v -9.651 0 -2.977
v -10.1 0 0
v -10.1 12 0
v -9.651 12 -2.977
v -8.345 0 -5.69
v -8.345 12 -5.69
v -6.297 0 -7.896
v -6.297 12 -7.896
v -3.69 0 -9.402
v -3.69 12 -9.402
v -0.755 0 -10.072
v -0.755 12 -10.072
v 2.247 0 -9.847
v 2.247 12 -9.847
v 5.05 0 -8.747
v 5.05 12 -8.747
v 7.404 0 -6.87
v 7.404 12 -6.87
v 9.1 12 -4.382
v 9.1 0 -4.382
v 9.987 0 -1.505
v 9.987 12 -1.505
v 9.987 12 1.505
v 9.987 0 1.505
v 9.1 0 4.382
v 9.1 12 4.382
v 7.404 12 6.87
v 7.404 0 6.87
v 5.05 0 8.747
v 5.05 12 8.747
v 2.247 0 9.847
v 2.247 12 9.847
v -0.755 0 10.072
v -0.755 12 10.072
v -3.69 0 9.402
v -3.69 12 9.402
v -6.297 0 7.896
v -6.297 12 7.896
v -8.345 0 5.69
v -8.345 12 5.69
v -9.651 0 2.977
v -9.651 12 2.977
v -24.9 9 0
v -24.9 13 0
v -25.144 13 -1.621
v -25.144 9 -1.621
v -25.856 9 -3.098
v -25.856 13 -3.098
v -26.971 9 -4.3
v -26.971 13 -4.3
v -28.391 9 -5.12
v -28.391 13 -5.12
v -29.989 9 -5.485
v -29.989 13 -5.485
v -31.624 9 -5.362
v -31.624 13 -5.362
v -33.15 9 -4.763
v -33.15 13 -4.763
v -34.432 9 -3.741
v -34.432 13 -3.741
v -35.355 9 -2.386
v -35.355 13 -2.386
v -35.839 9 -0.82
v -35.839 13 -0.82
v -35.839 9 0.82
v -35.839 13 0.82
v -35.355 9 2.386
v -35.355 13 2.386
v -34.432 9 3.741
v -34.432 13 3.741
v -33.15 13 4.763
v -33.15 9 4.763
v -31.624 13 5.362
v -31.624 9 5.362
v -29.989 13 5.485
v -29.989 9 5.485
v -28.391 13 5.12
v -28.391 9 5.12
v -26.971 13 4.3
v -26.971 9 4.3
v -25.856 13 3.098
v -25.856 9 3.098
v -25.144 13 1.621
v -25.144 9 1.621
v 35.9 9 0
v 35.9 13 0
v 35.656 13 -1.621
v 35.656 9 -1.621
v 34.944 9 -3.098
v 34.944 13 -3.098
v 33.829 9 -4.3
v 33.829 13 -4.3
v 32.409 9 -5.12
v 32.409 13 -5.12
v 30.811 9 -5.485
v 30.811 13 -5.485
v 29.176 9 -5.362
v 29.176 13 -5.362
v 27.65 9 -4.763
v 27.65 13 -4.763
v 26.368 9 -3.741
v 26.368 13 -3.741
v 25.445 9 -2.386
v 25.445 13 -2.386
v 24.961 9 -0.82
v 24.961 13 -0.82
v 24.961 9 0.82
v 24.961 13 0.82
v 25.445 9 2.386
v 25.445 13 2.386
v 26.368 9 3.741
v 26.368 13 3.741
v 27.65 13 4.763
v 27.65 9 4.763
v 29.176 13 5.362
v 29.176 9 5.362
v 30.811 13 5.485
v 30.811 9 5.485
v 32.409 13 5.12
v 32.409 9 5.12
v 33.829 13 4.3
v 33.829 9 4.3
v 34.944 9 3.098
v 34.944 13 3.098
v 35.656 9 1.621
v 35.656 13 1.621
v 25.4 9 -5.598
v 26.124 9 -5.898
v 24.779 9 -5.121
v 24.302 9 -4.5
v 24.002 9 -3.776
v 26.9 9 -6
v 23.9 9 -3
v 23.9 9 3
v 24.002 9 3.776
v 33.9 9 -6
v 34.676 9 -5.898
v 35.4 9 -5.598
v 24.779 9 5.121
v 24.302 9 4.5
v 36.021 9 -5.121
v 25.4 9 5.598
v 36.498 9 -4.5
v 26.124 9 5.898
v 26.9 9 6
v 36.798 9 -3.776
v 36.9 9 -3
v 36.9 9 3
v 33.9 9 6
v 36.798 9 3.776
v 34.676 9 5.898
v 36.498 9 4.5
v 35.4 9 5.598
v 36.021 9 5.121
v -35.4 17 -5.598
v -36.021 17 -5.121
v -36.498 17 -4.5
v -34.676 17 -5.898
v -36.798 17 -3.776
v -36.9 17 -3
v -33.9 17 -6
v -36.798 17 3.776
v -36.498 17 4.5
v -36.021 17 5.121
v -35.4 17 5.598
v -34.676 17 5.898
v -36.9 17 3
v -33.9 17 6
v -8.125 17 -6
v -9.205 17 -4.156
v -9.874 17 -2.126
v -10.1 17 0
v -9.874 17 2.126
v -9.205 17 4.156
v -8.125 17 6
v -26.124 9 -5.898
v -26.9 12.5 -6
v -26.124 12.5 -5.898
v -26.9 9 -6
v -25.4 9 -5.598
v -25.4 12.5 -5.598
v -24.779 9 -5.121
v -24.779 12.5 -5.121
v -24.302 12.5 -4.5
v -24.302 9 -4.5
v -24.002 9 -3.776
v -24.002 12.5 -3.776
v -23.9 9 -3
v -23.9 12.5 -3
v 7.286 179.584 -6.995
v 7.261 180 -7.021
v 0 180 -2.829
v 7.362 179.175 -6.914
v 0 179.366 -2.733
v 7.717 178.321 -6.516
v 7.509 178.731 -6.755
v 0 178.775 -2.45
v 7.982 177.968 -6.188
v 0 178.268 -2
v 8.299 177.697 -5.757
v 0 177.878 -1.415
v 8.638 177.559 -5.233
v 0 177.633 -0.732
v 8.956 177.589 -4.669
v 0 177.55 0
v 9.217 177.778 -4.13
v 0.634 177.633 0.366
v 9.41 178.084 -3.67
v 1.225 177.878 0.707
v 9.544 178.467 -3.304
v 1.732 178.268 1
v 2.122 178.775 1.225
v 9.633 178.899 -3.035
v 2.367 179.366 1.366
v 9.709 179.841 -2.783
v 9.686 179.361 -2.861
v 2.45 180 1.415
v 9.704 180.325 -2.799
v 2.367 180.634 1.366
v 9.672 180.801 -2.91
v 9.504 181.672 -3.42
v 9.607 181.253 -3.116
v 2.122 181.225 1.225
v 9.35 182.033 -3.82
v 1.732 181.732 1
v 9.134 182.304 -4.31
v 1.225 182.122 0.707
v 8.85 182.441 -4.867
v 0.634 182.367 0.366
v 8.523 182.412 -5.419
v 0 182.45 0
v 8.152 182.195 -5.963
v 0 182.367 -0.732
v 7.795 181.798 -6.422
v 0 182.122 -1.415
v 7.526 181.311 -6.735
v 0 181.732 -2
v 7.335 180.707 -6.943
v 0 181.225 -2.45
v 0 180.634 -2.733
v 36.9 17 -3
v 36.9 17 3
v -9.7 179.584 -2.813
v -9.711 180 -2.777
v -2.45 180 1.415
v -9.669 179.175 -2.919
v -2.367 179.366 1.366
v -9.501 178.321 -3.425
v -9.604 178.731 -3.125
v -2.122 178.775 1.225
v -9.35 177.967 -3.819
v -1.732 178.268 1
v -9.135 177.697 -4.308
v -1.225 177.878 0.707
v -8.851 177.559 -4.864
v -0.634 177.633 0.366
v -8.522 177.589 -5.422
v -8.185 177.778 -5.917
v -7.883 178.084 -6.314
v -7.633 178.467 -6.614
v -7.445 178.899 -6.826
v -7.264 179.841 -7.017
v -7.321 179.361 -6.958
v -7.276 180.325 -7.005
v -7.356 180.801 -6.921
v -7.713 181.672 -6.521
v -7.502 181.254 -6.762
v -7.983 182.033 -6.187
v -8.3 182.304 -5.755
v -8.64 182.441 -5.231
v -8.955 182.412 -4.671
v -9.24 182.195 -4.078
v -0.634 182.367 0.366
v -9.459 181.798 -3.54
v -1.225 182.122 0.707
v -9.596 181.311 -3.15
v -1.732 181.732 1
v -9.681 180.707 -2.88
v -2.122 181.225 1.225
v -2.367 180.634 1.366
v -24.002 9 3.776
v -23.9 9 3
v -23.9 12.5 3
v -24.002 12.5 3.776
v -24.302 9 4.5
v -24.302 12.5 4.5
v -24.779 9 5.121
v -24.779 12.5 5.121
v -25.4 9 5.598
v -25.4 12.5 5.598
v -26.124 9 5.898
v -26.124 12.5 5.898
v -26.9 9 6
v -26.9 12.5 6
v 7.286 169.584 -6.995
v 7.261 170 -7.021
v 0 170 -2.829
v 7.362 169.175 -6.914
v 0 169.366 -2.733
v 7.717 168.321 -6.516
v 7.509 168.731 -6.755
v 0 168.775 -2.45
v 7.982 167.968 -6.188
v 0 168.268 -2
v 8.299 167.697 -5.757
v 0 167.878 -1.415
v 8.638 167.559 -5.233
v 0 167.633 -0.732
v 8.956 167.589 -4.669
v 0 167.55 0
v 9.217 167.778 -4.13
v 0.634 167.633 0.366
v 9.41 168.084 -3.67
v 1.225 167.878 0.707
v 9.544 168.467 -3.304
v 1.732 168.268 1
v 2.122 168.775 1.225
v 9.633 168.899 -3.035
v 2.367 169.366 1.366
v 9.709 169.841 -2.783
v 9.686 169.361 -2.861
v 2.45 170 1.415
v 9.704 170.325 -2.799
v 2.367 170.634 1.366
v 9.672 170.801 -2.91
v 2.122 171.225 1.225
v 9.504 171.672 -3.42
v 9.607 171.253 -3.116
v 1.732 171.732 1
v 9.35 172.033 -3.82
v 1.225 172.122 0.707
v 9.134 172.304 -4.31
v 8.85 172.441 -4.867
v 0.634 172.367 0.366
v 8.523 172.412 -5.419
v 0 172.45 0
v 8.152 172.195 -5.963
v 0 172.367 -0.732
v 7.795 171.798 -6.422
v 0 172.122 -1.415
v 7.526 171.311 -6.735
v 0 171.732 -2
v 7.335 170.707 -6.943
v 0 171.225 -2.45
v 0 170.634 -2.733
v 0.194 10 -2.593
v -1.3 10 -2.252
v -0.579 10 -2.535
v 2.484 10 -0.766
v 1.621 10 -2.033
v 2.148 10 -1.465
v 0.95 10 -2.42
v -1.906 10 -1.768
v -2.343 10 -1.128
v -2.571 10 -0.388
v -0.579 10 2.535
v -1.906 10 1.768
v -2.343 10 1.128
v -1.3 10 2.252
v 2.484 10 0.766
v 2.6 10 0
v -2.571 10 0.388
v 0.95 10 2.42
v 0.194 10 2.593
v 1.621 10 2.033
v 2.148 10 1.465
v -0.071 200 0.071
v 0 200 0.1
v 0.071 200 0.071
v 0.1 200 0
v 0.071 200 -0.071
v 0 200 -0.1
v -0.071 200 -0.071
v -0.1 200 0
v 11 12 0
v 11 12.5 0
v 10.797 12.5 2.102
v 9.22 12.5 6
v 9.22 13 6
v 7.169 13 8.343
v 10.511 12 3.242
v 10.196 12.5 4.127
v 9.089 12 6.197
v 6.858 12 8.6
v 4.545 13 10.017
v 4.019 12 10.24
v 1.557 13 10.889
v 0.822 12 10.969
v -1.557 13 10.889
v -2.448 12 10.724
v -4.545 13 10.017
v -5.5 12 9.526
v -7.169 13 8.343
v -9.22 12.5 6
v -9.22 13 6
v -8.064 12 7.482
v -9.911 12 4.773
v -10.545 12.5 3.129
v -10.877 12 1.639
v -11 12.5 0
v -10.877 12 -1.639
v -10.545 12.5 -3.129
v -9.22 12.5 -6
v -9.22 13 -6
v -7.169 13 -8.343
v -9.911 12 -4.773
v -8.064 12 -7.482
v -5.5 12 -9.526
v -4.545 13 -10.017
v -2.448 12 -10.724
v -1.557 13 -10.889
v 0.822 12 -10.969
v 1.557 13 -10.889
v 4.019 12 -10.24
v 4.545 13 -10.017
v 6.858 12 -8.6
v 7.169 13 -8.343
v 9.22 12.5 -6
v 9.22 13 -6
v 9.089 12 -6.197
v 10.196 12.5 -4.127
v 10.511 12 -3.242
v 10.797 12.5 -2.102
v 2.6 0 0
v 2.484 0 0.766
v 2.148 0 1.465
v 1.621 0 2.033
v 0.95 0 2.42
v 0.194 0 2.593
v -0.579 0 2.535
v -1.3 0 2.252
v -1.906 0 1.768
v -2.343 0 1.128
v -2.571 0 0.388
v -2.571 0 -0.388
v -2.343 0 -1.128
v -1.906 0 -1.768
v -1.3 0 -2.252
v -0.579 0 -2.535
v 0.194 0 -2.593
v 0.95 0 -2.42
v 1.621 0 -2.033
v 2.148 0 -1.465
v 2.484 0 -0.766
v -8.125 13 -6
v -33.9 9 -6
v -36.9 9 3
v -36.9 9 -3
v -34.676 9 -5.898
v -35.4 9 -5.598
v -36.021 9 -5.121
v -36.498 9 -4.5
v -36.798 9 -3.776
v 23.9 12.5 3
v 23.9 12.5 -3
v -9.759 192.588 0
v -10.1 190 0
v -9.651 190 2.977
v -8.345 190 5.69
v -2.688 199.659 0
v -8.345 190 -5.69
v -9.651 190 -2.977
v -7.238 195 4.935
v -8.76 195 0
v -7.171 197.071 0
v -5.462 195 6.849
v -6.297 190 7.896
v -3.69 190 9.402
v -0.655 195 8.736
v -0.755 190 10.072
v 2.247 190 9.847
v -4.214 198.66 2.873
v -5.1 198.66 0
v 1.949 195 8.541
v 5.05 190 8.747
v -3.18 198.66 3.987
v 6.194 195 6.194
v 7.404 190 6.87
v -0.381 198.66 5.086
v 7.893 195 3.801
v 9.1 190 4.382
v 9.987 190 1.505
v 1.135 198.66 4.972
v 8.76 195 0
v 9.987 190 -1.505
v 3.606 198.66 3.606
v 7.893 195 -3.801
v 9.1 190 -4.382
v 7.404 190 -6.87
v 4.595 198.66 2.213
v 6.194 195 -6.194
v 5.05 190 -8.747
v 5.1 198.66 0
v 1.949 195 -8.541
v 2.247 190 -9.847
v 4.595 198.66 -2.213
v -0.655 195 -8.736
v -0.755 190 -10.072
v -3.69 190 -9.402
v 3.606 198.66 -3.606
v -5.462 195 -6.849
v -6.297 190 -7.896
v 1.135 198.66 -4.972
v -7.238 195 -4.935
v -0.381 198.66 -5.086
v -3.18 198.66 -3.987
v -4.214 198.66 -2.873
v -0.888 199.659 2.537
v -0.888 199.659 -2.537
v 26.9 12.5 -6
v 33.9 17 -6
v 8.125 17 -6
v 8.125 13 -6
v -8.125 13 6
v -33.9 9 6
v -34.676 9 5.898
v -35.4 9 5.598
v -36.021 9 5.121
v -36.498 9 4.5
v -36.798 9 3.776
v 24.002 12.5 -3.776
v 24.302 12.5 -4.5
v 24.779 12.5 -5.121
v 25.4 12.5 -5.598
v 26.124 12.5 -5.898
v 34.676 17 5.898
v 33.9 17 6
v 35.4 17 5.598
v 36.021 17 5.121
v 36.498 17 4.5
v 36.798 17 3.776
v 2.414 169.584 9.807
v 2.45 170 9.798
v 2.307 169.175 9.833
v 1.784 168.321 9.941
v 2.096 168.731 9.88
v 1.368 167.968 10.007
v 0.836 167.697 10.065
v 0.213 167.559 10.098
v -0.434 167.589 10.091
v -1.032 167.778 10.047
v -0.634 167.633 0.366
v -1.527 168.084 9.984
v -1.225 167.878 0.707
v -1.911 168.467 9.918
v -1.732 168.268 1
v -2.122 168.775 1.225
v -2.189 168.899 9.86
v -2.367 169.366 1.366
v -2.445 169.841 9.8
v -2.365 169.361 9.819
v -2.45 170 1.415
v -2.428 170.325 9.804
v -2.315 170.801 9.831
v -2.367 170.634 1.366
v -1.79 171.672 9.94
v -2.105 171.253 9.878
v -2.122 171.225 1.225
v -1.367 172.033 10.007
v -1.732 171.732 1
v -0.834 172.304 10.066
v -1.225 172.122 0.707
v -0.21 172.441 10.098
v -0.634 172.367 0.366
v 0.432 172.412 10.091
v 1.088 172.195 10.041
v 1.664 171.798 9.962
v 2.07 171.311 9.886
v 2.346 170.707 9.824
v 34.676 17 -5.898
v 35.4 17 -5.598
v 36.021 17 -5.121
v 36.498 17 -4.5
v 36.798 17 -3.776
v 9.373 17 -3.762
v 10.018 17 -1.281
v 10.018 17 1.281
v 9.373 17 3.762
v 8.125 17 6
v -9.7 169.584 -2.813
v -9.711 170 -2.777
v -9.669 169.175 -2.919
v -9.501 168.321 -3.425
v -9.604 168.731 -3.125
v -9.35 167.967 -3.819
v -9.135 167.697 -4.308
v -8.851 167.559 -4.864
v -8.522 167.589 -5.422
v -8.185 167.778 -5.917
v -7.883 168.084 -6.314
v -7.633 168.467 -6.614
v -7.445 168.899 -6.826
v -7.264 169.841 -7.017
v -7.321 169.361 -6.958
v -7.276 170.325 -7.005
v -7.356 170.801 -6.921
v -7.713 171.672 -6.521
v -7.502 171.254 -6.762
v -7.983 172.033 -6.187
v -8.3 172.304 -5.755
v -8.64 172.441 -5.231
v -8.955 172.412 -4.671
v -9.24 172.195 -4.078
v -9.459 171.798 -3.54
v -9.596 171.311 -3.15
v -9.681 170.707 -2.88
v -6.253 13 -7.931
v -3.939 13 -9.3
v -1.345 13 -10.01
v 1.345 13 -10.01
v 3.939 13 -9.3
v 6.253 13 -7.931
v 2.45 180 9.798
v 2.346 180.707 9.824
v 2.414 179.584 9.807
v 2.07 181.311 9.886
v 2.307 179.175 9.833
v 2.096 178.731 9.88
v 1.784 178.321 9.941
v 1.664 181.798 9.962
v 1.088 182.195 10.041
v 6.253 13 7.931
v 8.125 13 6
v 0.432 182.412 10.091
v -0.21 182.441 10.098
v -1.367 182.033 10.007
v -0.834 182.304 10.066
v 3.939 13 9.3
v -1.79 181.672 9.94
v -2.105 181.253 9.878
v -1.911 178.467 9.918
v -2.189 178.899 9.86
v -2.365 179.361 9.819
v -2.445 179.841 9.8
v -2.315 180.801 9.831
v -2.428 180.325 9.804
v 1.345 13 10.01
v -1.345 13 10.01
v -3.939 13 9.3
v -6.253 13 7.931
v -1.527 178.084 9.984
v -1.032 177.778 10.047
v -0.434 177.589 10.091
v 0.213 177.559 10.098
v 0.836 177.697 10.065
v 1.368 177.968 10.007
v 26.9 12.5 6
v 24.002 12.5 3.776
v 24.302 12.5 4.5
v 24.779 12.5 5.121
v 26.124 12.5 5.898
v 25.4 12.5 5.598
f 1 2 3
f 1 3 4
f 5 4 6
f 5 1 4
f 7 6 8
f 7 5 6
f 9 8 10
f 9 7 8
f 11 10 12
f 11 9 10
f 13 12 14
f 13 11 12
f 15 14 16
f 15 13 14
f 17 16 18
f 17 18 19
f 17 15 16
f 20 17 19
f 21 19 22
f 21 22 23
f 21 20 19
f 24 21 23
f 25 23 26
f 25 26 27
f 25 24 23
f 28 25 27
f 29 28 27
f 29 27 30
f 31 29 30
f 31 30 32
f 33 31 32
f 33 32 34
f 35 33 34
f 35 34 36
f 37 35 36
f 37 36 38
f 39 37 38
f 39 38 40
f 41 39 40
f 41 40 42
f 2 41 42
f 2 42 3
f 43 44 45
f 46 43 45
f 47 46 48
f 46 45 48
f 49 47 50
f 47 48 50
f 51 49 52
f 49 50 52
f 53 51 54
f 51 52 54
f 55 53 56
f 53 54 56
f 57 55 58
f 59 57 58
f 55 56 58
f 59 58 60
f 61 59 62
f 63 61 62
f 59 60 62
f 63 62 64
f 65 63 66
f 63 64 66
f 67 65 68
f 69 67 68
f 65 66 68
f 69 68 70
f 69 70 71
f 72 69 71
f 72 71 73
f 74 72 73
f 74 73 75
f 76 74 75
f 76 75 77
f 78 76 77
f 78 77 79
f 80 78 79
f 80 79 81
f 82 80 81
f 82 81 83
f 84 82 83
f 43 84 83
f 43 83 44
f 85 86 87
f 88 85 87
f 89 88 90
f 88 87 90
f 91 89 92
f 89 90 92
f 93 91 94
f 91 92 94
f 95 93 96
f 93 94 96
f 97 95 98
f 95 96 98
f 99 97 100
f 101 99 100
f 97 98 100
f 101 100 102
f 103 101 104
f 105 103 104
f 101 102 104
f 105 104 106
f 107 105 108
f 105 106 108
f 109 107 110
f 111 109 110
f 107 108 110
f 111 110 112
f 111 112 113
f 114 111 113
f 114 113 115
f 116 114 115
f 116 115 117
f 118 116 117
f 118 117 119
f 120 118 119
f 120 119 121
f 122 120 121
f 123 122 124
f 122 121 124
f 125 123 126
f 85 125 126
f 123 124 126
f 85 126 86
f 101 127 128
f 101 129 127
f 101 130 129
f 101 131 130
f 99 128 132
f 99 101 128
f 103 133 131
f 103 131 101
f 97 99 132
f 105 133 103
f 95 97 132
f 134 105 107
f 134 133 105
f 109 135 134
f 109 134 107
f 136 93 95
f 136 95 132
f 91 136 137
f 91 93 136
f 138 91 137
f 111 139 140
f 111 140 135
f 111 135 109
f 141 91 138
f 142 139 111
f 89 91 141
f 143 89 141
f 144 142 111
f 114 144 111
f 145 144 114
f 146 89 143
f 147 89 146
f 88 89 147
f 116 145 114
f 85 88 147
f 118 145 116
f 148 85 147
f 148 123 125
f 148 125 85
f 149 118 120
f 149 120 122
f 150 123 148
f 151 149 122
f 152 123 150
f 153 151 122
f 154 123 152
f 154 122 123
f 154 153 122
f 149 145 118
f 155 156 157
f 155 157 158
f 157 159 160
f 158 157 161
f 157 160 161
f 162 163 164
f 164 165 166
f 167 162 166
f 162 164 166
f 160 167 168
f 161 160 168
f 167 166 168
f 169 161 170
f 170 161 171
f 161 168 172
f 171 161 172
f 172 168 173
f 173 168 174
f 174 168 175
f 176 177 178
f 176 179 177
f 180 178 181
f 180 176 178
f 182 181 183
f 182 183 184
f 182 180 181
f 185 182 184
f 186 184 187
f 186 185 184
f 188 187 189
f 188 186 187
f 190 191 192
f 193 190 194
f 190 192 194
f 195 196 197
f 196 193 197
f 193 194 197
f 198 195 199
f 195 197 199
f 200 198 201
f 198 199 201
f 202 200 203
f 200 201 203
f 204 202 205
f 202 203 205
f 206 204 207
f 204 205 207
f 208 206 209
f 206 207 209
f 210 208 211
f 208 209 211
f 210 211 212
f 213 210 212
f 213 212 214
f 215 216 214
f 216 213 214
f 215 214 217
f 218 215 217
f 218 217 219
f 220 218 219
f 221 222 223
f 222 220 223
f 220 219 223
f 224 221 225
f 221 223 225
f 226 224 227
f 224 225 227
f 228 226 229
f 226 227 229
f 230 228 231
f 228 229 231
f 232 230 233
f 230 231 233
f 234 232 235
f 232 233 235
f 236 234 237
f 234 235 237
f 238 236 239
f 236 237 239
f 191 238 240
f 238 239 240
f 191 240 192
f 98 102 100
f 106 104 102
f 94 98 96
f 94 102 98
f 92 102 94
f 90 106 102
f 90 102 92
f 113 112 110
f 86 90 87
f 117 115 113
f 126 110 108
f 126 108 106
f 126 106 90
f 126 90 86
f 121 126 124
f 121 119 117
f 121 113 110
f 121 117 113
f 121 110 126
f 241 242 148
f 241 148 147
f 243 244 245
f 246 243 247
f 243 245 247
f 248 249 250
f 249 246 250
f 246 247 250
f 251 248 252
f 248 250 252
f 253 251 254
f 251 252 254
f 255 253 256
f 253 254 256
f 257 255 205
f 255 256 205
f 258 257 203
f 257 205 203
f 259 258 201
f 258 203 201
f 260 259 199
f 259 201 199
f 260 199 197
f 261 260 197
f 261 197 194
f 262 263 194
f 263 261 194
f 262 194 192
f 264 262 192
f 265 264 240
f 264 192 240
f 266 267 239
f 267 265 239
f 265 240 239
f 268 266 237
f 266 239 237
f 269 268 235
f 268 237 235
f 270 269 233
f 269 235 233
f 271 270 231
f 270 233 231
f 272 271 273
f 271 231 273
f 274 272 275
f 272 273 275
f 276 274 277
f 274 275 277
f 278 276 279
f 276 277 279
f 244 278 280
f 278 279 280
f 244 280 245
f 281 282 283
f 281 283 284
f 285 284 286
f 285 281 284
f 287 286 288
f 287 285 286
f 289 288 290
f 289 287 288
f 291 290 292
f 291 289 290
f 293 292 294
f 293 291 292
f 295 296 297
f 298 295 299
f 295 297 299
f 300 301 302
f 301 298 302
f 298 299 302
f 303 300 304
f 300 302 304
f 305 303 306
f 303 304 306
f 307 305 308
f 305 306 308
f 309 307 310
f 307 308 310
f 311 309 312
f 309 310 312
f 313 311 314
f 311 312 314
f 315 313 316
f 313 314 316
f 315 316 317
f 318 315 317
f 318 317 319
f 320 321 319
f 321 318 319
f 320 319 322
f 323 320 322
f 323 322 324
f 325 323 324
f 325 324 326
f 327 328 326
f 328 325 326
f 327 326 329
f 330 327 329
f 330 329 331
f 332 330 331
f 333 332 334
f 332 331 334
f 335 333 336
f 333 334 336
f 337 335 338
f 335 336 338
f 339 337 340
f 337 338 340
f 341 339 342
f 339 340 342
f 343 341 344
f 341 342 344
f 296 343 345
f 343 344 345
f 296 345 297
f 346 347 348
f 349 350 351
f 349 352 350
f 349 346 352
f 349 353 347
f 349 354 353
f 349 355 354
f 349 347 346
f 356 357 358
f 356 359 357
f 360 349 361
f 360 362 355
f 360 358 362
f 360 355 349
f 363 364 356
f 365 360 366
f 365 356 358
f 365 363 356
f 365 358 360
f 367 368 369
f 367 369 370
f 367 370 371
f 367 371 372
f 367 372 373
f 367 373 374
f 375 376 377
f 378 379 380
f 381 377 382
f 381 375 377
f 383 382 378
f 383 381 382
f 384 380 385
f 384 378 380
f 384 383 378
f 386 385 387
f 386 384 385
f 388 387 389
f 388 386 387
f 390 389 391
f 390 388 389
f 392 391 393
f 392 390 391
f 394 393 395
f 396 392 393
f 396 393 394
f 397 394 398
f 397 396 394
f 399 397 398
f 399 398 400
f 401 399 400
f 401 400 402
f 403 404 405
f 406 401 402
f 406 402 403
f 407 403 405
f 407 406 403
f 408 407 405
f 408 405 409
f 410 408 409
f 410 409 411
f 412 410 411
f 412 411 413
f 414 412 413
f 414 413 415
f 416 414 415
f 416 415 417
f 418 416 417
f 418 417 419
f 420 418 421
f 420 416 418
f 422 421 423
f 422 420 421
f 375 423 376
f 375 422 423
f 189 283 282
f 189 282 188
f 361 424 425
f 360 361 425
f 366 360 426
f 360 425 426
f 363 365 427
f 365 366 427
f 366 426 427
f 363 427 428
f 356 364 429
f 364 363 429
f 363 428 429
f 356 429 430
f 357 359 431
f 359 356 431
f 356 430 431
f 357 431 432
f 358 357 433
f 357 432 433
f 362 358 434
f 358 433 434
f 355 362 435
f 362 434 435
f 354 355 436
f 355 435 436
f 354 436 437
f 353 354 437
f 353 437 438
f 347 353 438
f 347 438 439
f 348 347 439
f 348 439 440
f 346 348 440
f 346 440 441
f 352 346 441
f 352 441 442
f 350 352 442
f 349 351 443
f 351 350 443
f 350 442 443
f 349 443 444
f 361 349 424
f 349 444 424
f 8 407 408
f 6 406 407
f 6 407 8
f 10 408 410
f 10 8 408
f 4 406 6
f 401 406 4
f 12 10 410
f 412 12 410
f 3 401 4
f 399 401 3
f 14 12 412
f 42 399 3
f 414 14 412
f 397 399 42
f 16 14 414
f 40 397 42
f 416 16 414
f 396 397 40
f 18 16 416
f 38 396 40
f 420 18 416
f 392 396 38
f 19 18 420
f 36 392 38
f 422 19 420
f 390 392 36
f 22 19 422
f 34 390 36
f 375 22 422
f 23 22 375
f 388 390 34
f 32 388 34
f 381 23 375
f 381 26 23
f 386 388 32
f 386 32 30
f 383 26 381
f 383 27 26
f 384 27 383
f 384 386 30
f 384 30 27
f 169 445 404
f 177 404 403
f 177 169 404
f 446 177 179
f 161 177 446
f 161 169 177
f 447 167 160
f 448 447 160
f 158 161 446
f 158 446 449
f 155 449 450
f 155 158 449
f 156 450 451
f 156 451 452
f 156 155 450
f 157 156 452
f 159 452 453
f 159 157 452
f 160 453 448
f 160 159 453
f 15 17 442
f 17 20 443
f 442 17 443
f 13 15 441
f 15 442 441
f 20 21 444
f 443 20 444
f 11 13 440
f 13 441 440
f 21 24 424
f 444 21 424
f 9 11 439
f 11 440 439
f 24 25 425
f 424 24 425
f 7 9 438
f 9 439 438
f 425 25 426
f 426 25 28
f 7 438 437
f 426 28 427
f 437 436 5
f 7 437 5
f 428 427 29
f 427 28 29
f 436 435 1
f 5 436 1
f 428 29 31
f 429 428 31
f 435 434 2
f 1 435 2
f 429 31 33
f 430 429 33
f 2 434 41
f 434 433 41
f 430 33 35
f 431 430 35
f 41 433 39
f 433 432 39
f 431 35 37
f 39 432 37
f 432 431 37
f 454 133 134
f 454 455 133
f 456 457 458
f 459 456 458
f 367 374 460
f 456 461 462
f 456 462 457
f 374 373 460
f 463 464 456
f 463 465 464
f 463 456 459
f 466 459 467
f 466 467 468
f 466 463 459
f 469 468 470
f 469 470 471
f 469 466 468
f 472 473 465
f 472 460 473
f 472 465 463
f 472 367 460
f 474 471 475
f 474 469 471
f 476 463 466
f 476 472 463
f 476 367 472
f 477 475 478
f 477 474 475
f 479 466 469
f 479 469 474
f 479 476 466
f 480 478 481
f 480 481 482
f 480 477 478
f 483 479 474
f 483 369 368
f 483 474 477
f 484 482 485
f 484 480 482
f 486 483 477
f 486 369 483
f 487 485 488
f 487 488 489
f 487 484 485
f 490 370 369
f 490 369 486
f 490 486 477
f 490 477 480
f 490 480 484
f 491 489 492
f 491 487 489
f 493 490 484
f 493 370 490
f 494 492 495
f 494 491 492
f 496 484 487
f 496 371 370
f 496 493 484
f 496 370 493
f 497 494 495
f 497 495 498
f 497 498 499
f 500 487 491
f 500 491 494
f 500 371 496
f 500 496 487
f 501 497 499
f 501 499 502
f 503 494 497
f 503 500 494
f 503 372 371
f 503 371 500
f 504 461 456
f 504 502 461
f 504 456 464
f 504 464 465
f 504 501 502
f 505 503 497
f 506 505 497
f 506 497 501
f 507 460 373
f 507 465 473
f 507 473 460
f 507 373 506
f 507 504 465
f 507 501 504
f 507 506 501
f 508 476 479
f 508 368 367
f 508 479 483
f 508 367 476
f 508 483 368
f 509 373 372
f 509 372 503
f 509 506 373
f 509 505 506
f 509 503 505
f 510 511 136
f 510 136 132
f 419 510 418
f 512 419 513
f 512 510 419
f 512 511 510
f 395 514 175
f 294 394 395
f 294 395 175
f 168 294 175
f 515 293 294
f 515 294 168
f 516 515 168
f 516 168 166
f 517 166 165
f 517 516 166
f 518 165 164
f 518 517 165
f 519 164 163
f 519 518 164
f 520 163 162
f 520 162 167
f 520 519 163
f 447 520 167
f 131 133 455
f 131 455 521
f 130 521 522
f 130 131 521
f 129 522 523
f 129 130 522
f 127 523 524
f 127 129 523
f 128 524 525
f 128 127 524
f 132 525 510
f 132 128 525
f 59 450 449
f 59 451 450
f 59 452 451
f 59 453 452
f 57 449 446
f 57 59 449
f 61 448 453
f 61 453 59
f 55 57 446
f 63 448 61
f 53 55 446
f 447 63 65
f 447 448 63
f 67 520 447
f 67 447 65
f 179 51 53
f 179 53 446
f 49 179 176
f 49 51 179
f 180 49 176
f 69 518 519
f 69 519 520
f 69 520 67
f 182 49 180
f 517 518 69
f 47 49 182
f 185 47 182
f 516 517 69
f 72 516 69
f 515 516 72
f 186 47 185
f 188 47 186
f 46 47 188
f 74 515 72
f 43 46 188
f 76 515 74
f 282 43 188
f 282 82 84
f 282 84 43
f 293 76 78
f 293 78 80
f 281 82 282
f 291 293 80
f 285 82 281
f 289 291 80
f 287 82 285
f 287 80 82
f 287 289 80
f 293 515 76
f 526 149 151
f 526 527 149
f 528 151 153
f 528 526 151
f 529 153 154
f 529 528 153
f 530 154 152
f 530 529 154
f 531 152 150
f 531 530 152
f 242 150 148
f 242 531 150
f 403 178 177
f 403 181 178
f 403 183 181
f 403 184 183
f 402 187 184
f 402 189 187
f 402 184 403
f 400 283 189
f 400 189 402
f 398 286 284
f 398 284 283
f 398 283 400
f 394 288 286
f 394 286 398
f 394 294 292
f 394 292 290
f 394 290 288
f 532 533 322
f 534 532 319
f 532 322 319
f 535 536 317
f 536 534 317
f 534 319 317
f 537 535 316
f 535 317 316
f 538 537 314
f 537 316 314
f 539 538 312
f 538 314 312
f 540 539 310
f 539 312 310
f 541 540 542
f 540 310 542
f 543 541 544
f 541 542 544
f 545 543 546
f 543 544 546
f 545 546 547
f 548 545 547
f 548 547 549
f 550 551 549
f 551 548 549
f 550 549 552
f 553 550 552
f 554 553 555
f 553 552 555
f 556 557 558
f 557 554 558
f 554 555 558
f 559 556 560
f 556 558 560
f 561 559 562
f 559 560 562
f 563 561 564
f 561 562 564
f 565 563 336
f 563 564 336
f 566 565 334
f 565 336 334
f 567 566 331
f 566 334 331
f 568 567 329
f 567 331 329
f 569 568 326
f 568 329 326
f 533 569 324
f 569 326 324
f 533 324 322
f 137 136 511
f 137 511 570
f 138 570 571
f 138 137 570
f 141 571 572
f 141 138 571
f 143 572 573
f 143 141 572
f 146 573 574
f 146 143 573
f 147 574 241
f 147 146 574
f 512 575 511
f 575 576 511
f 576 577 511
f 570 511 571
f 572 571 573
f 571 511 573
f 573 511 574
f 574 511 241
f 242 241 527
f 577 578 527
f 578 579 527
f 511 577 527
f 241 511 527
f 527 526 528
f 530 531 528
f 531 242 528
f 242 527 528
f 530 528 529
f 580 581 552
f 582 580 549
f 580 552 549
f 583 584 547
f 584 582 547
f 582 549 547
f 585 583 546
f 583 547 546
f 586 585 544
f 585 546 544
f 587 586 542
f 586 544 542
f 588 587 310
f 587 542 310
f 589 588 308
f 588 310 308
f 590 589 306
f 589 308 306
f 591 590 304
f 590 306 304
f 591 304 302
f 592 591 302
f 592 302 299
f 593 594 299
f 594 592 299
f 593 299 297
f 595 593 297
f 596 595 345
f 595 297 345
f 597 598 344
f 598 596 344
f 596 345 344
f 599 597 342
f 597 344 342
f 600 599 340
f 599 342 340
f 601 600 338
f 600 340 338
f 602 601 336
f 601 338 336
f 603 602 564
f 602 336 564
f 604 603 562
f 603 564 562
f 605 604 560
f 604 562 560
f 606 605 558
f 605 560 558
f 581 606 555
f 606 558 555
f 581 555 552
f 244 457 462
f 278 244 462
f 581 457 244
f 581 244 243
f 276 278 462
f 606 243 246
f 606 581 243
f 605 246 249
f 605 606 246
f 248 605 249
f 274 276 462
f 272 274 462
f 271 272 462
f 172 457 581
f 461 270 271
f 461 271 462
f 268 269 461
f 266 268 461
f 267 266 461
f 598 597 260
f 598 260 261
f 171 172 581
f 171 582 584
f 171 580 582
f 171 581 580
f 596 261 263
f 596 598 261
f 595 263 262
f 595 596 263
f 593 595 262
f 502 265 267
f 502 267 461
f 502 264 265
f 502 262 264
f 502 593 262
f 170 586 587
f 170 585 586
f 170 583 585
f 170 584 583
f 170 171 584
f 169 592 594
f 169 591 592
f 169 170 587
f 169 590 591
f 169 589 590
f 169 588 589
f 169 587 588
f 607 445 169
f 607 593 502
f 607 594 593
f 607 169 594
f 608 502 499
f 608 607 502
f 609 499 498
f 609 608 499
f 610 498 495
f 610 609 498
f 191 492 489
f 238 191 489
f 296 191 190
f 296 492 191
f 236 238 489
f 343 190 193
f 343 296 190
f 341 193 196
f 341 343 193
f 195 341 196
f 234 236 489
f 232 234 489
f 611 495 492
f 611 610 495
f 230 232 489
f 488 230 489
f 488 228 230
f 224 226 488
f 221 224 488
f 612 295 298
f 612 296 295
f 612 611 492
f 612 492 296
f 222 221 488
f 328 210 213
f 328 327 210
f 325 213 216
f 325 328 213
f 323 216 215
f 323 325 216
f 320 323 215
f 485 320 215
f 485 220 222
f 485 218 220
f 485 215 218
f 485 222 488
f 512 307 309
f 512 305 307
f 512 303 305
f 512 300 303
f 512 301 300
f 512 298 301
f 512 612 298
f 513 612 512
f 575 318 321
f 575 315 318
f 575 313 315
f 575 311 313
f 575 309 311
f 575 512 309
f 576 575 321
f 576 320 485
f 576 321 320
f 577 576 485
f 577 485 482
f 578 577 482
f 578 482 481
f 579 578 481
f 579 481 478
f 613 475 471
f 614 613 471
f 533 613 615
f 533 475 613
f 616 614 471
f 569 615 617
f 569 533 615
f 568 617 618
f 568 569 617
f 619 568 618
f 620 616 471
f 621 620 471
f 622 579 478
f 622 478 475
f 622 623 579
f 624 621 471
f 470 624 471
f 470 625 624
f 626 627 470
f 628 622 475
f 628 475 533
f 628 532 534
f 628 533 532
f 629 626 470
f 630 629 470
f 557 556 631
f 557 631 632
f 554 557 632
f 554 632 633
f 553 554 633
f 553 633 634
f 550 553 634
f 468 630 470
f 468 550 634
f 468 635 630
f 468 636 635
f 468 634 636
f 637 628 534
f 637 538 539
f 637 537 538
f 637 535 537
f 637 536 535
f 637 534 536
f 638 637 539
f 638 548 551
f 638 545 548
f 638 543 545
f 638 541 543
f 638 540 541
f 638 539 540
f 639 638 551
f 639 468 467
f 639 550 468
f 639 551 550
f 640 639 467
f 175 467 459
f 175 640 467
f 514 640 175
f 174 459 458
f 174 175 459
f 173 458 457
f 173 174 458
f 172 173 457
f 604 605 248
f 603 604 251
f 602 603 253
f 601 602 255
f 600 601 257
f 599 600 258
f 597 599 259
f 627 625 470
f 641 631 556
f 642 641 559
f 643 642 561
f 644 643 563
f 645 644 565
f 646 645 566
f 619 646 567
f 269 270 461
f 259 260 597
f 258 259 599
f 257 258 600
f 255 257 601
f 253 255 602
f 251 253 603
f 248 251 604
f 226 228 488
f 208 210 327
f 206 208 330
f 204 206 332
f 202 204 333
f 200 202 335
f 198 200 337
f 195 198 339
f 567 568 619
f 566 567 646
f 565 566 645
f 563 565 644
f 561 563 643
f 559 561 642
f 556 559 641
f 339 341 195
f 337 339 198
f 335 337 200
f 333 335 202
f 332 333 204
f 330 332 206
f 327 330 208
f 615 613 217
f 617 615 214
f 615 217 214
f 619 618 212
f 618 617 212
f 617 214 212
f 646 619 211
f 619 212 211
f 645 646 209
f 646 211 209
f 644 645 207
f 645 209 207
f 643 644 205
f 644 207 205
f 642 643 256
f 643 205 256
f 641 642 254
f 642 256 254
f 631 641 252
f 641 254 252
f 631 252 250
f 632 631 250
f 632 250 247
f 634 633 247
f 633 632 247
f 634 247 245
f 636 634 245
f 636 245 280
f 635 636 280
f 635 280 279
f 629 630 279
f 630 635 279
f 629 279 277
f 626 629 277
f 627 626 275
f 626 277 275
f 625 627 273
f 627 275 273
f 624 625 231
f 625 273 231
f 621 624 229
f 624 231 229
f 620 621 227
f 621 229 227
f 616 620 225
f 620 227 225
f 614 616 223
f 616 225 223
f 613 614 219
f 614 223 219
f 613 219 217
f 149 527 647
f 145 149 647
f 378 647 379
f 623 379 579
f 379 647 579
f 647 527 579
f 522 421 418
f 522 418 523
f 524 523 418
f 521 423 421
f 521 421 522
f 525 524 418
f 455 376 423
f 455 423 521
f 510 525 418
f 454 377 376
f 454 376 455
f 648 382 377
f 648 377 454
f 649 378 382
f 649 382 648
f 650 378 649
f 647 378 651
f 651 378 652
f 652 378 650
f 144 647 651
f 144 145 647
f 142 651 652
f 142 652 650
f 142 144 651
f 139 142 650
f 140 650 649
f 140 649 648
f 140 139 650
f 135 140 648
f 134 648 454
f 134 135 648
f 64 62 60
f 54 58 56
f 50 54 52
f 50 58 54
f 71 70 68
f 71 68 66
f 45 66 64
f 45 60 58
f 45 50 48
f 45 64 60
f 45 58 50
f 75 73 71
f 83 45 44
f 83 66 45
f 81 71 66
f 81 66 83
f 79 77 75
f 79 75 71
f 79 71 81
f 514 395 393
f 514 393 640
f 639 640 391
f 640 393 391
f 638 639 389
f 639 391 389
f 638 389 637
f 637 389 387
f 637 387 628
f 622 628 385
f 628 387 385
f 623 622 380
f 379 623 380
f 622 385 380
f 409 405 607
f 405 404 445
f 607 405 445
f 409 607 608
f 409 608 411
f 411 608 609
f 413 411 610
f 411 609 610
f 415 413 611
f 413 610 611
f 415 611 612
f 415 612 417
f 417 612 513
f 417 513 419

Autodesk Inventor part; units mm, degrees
ref_plane "YZ Plane" through (0, 0, 0) normal (1, 0, 0) x (0, 1, 0)
sketch "Szkic1" plane through (0, 0, 0) normal (0, 1, 0) x (-1, 0, 0)
  circle A0 centre (0, 0) radius 10.1
  dimension "d0" = 20.2
extrude "Wyciągnięcie proste1" add sketch "Szkic1" along normal blind 200
ref_plane "Płaszczyzna konstrukcyjna1" through (0, 13, 0) normal (0, -1, 0) x (1, 0, 0)
sketch "Szkic2" plane through (0, 13, 0) normal (0, -1, 0) x (1, 0, 0)
  line L0 (0, 0) -> (30.4, 0)
  line L1 (0, 0) -> (30.4, 0) construction
  circle A0 centre (30.4, 0) radius 5.5
  line L2 (35.9, 0) -> (36.9, 0)
  line L3 (36.9, 0) -> (0, 0)
  line L4 (0, 0) -> (0, -6)
  line L5 (0, -6) -> (36.9, -6)
  line L6 (36.9, -6) -> (36.9, 0)
  line L7 (0, 0) -> (0, -16.4984)
  line L8 (0, 6) -> (36.9, 6)
  line L9 (36.9, 6) -> (36.9, 0)
  line L10 (0, 0) -> (-30.4, 0)
  line L11 (0, 0) -> (-30.4, 0) construction
  circle A1 centre (-30.4, 0) radius 5.5
  line L12 (-35.9, 0) -> (-36.9, 0)
  line L13 (-36.9, 0) -> (0, 0)
  line L14 (0, -6) -> (-36.9, -6)
  line L15 (0, 6) -> (-36.9, 6)
  line L16 (-36.9, 6) -> (-36.9, -6)
  line L17 (-24.9, 0) -> (-23.9, 0)
  line L18 (-23.9, 0) -> (-23.9, 6)
  line L19 (-23.9, 0) -> (-23.9, -6)
  line L20 (24.9, 0) -> (23.9, 0)
  line L21 (23.9, 0) -> (23.9, 6)
  line L22 (23.9, 0) -> (23.9, -6)
  dimension "d4" = 30.4
  dimension "d5" = 0
  dimension "d6" = 11
  dimension "d7" = 1
  dimension "d8" = 6
  dimension "d13" = 1
  dimension "d14" = 1
extrude "Wyciągnięcie proste2" add sketch "Szkic2" along normal blind 0.5 contours L10 L18 L15 L8 L21 L0 | L0 L22 L5 L4 | L4 L14 L19 L10 | L21 L8 L9 L2 A0 L0 | L0 A0 L2 L6 L5 L22 | L19 L14 L16 L12 A1 L10 | L10 A1 L12 L16 L15 L18
extrude "Wyciągnięcie proste3" add sketch "Szkic2" against normal blind 4
extrude "Wyciągnięcie proste4" add sketch "Szkic2" along normal blind 4 contours L21 L8 L9 L2 A0 L0 | L0 A0 L2 L6 L5 L22 | L19 L14 L16 L12 A1 L10 | L10 A1 L12 L16 L15 L18
fillet "Zaokrąglenie1" radius 3 8 edges at (-36.9, 13, 6) (-23.9, 10.75, 6) (-36.9, 13, -6) (-23.9, 10.75, -6) (36.9, 13, 6) (23.9, 10.75, 6) (36.9, 13, -6) (23.9, 10.75, -6)
sketch "Szkic3" plane through (0, 0, 0) normal (0, 0, 1) x (1, 0, 0)
  line L0 (10.1, 200) -> (-10.1, 200) projected
  line L1 (0, 200) -> (0, 190)
  line L2 (0, 190) -> (0, 180)
  line L3 (0, 180) -> (0, 170)
  circle A0 centre (0, 170) radius 2.45
  circle A1 centre (0, 180) radius 2.45
  point P0 (0, 0)
  dimension "d21" = 10
  dimension "d22" = 10
  dimension "d23" = 10
  dimension "d24" = 4.9
  dimension "d25" = 4.9
extrude "Wyciągnięcie proste5" cut sketch "Szkic3" along normal blind 60
pattern_circular "Szyk kołowy1" count 3 over 360 about axis through (0, 0, 0) along (0, 1, 0) of "Wyciągnięcie proste5"
fillet "Zaokrąglenie2" radius 10 1 edges at (10.1, 200, 0)
ref_plane "Płaszczyzna konstrukcyjna2" through (0, 12, 0) normal (0, -1, 0) x (1, 0, 0)
sketch "Szkic4" plane through (0, 12, 0) normal (0, -1, 0) x (1, 0, 0)
  circle A0 centre (0, 0) radius 11
  dimension "d36" = 22
extrude "Wyciągnięcie proste6" add sketch "Szkic4" against normal blind 1
sketch "Szkic5" plane through (0, 0, 0) normal (0, -1, 0) x (1, 0, 0)
  line L0 (0, -2.829) -> (0, 0) projected
  circle A0 centre (0, 0) radius 2.6
  dimension "d39" = 5.2
extrude "Wyciągnięcie proste7" cut sketch "Szkic5" against normal blind 10
properties part number "andomierz_wal" material "Tworzywo sztuczne ABS"
